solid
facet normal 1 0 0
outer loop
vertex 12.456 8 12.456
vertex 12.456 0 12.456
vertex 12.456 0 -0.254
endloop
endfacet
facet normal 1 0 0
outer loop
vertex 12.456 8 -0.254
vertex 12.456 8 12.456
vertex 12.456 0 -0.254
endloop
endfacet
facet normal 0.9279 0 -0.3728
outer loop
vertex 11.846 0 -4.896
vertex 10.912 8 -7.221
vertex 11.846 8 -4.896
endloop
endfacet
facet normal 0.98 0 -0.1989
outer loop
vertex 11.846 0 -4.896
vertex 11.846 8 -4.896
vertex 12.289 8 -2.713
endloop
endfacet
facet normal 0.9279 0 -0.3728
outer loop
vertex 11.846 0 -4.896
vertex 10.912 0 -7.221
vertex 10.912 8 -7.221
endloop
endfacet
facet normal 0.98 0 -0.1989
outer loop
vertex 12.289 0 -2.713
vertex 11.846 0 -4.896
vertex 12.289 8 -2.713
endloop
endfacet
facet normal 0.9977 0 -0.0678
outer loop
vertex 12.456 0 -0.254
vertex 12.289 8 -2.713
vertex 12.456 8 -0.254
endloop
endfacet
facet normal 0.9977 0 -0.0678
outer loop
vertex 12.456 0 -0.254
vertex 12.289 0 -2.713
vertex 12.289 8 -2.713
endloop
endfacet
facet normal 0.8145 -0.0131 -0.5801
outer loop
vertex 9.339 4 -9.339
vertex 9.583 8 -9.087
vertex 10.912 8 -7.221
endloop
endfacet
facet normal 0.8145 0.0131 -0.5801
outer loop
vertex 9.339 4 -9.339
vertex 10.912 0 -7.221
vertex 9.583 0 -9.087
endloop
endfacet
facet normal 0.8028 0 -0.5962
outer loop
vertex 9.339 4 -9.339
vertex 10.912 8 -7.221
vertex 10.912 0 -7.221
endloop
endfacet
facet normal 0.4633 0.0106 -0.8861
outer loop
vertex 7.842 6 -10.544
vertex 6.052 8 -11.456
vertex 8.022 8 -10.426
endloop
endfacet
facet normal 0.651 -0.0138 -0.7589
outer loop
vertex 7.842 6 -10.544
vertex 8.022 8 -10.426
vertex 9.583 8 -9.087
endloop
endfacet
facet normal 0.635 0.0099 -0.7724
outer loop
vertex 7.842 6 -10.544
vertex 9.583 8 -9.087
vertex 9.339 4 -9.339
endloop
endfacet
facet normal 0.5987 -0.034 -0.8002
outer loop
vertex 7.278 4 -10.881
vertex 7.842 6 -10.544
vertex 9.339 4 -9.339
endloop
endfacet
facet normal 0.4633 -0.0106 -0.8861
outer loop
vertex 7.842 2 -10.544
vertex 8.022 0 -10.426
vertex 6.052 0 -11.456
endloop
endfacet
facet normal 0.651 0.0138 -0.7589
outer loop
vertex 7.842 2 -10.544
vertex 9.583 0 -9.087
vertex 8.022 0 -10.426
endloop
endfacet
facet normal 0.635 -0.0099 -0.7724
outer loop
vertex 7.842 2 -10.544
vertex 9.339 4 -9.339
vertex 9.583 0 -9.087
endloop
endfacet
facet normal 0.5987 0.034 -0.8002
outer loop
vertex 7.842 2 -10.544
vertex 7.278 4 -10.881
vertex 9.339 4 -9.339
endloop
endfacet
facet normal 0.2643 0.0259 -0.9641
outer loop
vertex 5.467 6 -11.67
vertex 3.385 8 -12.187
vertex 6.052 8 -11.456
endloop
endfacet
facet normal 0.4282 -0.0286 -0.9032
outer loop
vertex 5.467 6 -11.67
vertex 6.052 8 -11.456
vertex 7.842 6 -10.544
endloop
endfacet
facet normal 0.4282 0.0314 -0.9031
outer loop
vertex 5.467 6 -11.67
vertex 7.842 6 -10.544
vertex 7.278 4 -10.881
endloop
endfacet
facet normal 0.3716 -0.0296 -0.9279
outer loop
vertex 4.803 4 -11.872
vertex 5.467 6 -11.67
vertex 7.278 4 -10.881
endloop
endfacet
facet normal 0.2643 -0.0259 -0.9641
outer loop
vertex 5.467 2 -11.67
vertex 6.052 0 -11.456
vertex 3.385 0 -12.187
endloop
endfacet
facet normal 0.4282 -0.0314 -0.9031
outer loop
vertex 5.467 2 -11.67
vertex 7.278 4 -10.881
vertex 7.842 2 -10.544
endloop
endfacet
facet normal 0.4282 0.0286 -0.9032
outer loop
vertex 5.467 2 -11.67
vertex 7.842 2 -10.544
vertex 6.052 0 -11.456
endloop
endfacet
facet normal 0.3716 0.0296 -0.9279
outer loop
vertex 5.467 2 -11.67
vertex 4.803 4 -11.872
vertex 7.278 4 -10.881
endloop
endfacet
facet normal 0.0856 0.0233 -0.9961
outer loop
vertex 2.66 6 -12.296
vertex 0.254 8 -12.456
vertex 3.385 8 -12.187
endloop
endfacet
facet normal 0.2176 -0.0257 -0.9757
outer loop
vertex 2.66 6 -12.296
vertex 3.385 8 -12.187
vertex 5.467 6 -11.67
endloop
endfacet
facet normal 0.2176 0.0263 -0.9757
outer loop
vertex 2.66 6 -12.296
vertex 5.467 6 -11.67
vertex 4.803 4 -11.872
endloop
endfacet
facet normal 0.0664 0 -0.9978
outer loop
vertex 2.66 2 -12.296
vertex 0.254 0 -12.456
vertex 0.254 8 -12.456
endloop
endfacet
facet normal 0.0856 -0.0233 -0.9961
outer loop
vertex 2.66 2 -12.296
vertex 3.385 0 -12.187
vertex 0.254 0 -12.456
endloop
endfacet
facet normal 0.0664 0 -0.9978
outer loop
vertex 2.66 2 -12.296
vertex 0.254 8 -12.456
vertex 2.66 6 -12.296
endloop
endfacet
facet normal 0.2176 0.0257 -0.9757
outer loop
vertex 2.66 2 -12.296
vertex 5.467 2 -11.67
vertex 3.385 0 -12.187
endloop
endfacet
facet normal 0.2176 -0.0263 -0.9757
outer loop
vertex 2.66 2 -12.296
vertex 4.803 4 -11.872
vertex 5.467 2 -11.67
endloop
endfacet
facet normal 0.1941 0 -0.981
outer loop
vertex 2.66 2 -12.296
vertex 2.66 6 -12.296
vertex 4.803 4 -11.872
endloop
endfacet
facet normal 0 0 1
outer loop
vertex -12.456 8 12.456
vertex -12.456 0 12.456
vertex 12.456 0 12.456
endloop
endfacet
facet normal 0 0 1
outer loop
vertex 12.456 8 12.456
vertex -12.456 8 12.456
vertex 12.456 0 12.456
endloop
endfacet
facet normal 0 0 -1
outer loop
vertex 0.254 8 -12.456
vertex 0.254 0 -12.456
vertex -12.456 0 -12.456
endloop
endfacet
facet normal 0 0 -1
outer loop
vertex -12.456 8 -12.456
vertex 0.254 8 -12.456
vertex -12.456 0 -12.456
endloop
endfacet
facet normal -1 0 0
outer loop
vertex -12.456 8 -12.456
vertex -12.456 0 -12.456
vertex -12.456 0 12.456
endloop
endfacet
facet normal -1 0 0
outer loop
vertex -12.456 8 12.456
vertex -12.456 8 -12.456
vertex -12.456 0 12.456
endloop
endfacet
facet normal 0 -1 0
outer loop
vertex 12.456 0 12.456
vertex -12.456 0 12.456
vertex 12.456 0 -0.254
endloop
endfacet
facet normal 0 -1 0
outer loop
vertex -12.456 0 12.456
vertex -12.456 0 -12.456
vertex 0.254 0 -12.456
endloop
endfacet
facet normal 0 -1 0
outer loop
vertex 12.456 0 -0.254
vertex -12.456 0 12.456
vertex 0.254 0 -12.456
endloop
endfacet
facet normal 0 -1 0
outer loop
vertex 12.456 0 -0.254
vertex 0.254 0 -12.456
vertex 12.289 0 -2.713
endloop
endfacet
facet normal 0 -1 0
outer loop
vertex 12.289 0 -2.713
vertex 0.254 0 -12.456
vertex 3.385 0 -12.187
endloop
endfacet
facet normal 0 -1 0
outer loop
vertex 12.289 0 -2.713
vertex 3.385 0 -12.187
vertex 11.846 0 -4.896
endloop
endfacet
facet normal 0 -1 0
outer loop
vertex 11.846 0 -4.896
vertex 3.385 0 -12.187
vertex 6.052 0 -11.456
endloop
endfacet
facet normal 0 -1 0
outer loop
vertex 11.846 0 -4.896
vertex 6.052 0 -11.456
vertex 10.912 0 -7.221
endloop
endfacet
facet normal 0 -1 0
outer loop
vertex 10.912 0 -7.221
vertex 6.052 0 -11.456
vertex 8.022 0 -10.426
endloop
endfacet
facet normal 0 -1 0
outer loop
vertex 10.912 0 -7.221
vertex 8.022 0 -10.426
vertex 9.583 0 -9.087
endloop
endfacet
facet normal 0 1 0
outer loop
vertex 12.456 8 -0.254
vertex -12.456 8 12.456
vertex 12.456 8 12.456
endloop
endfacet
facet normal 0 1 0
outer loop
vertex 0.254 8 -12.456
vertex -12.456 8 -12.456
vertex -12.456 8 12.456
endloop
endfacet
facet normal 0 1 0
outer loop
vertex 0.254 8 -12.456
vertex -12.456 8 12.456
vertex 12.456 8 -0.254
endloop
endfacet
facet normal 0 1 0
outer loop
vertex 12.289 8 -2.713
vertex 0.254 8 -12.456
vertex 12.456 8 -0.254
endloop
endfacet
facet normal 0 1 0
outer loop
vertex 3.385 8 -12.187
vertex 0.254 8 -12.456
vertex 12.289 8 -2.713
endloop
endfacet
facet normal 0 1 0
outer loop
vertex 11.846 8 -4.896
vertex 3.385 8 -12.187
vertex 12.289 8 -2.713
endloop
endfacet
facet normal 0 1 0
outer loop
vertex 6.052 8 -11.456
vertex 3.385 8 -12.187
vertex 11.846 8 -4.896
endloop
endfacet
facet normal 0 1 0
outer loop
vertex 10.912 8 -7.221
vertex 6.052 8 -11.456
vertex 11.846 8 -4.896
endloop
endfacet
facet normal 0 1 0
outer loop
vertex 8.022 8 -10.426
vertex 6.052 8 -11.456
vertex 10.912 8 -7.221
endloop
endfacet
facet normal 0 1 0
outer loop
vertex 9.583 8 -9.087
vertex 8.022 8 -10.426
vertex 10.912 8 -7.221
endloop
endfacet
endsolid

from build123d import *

# Parameters (mm, degrees)
BOSS_EXTRUDE1_DEPTH = 8


with BuildPart() as part:
    # Sketch1 → Boss-Extrude1 (new body)
    with BuildSketch(Plane(origin=(0, 0, 0), x_dir=(1, 0, 0), z_dir=(0, 1, 0))):
        with BuildLine():
            Line((0, 12.455769231), (-12.455769231, 12.455769231))
            Line((-12.455769231, 12.455769231), (-12.455769231, -12.455769231))
            Line((-12.455769231, -12.455769231), (12.455769231, -12.455769231))
            Line((12.455769231, -12.455769231), (12.455769231, 0))
            Line((12.455769231, 0), (12.455769231, 0.254))
            add(Edge.make_bspline(
                [(0.254, 12.455769231), (12.324048116, 12.324048116), (12.455769231, 0.254)],
                knots=[0, 0, 0, 1, 1, 1], degree=2))
            Line((0.254, 12.455769231), (0, 12.455769231))
        make_face()
    extrude(amount=BOSS_EXTRUDE1_DEPTH)


solid = part.part
